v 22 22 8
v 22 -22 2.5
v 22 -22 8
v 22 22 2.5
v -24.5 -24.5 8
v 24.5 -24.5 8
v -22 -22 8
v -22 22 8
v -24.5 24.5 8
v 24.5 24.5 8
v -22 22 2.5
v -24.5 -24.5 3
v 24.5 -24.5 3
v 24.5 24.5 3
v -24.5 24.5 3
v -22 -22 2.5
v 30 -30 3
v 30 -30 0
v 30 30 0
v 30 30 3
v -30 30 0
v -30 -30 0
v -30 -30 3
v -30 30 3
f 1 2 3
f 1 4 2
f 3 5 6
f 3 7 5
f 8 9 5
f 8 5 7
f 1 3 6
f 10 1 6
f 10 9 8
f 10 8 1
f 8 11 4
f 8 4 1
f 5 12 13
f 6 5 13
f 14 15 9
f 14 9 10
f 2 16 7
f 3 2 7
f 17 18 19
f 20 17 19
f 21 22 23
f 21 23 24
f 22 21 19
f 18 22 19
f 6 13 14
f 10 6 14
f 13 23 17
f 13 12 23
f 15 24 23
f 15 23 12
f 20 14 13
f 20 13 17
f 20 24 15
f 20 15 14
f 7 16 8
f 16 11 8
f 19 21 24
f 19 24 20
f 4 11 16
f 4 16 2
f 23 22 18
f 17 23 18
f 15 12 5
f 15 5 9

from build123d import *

# Parameters (mm, degrees)
F0_W        = 60
F0_H        = 60
F1_DEPTH    = 3
F2_W        = 49
F2_H        = 49
F3_DEPTH    = 5
F4_T        = 2.5
F4_T3_DEPTH = 54
F4_T5_DEPTH = 54


# Not quite as in the source:
# - a shell that OpenCascade refuses in one call is made with other operations: the cavity is built on its own and cut out


with BuildPart() as f1:
    # F0 (on Top) → F1 (new body)
    with BuildSketch(Plane.XY):
        Rectangle(F0_W, F0_H)
    extrude(amount=F1_DEPTH)

    # F2 (on face) → F3 (join)
    with BuildSketch(Plane.XY.offset(3)):
        Rectangle(F2_W, F2_H)
    extrude(amount=F3_DEPTH)

    # F4: shell of thickness 2.5, made by hand


with BuildPart() as f4_core1:
    # F4_t2: copy of F1
    add(f1.part)

    # the walls: a layer under each face that stays
    f4_faces = [f4_core1.faces().sort_by_distance(p)[0] for p in [
        (0, -30, 1.5),
        (-30, 0, 1.5),
        (30, 0, 1.5),
        (0, 0, 0),
        (-25.7142857143, -25.7142857143, 3),
        (0, 30, 1.5),
        (0, -24.5, 5.5),
        (24.5, 0, 5.5),
        (0, 24.5, 5.5),
        (-24.5, 0, 5.5),
    ]]
    thicken(f4_faces, amount=-F4_T, mode=Mode.SUBTRACT)

    # F4_s4 → F4_t3 (cut)
    with BuildSketch(Plane.YZ.offset(-27)):
        Polygon((-24.525, 3.025), (-24.5, 0.5), (-22, 0.5), (-22, 3), align=None)
        Polygon((24.525, 3.025), (24.5, 0.5), (22, 0.5), (22, 3), align=None)
    extrude(amount=F4_T3_DEPTH, mode=Mode.SUBTRACT)

    # F4_s6 → F4_t5 (cut)
    with BuildSketch(Plane.XZ.offset(-27)):
        Polygon((24.525, 3.025), (24.5, 0.5), (22, 0.5), (22, 3), align=None)
        Polygon((-24.525, 3.025), (-24.5, 0.5), (-22, 0.5), (-22, 3), align=None)
    extrude(amount=F4_T5_DEPTH, mode=Mode.SUBTRACT)


with BuildPart() as f1_1:
    add(f1.part)

    # what is left inside the walls is the cavity
    f4_cavity = [f4_core1.part.solids().sort_by_distance(p)[0] for p in [
        (0, -7.333333, 2.525),
    ]]
    add(f4_cavity, mode=Mode.SUBTRACT)


solid = f1_1.part
